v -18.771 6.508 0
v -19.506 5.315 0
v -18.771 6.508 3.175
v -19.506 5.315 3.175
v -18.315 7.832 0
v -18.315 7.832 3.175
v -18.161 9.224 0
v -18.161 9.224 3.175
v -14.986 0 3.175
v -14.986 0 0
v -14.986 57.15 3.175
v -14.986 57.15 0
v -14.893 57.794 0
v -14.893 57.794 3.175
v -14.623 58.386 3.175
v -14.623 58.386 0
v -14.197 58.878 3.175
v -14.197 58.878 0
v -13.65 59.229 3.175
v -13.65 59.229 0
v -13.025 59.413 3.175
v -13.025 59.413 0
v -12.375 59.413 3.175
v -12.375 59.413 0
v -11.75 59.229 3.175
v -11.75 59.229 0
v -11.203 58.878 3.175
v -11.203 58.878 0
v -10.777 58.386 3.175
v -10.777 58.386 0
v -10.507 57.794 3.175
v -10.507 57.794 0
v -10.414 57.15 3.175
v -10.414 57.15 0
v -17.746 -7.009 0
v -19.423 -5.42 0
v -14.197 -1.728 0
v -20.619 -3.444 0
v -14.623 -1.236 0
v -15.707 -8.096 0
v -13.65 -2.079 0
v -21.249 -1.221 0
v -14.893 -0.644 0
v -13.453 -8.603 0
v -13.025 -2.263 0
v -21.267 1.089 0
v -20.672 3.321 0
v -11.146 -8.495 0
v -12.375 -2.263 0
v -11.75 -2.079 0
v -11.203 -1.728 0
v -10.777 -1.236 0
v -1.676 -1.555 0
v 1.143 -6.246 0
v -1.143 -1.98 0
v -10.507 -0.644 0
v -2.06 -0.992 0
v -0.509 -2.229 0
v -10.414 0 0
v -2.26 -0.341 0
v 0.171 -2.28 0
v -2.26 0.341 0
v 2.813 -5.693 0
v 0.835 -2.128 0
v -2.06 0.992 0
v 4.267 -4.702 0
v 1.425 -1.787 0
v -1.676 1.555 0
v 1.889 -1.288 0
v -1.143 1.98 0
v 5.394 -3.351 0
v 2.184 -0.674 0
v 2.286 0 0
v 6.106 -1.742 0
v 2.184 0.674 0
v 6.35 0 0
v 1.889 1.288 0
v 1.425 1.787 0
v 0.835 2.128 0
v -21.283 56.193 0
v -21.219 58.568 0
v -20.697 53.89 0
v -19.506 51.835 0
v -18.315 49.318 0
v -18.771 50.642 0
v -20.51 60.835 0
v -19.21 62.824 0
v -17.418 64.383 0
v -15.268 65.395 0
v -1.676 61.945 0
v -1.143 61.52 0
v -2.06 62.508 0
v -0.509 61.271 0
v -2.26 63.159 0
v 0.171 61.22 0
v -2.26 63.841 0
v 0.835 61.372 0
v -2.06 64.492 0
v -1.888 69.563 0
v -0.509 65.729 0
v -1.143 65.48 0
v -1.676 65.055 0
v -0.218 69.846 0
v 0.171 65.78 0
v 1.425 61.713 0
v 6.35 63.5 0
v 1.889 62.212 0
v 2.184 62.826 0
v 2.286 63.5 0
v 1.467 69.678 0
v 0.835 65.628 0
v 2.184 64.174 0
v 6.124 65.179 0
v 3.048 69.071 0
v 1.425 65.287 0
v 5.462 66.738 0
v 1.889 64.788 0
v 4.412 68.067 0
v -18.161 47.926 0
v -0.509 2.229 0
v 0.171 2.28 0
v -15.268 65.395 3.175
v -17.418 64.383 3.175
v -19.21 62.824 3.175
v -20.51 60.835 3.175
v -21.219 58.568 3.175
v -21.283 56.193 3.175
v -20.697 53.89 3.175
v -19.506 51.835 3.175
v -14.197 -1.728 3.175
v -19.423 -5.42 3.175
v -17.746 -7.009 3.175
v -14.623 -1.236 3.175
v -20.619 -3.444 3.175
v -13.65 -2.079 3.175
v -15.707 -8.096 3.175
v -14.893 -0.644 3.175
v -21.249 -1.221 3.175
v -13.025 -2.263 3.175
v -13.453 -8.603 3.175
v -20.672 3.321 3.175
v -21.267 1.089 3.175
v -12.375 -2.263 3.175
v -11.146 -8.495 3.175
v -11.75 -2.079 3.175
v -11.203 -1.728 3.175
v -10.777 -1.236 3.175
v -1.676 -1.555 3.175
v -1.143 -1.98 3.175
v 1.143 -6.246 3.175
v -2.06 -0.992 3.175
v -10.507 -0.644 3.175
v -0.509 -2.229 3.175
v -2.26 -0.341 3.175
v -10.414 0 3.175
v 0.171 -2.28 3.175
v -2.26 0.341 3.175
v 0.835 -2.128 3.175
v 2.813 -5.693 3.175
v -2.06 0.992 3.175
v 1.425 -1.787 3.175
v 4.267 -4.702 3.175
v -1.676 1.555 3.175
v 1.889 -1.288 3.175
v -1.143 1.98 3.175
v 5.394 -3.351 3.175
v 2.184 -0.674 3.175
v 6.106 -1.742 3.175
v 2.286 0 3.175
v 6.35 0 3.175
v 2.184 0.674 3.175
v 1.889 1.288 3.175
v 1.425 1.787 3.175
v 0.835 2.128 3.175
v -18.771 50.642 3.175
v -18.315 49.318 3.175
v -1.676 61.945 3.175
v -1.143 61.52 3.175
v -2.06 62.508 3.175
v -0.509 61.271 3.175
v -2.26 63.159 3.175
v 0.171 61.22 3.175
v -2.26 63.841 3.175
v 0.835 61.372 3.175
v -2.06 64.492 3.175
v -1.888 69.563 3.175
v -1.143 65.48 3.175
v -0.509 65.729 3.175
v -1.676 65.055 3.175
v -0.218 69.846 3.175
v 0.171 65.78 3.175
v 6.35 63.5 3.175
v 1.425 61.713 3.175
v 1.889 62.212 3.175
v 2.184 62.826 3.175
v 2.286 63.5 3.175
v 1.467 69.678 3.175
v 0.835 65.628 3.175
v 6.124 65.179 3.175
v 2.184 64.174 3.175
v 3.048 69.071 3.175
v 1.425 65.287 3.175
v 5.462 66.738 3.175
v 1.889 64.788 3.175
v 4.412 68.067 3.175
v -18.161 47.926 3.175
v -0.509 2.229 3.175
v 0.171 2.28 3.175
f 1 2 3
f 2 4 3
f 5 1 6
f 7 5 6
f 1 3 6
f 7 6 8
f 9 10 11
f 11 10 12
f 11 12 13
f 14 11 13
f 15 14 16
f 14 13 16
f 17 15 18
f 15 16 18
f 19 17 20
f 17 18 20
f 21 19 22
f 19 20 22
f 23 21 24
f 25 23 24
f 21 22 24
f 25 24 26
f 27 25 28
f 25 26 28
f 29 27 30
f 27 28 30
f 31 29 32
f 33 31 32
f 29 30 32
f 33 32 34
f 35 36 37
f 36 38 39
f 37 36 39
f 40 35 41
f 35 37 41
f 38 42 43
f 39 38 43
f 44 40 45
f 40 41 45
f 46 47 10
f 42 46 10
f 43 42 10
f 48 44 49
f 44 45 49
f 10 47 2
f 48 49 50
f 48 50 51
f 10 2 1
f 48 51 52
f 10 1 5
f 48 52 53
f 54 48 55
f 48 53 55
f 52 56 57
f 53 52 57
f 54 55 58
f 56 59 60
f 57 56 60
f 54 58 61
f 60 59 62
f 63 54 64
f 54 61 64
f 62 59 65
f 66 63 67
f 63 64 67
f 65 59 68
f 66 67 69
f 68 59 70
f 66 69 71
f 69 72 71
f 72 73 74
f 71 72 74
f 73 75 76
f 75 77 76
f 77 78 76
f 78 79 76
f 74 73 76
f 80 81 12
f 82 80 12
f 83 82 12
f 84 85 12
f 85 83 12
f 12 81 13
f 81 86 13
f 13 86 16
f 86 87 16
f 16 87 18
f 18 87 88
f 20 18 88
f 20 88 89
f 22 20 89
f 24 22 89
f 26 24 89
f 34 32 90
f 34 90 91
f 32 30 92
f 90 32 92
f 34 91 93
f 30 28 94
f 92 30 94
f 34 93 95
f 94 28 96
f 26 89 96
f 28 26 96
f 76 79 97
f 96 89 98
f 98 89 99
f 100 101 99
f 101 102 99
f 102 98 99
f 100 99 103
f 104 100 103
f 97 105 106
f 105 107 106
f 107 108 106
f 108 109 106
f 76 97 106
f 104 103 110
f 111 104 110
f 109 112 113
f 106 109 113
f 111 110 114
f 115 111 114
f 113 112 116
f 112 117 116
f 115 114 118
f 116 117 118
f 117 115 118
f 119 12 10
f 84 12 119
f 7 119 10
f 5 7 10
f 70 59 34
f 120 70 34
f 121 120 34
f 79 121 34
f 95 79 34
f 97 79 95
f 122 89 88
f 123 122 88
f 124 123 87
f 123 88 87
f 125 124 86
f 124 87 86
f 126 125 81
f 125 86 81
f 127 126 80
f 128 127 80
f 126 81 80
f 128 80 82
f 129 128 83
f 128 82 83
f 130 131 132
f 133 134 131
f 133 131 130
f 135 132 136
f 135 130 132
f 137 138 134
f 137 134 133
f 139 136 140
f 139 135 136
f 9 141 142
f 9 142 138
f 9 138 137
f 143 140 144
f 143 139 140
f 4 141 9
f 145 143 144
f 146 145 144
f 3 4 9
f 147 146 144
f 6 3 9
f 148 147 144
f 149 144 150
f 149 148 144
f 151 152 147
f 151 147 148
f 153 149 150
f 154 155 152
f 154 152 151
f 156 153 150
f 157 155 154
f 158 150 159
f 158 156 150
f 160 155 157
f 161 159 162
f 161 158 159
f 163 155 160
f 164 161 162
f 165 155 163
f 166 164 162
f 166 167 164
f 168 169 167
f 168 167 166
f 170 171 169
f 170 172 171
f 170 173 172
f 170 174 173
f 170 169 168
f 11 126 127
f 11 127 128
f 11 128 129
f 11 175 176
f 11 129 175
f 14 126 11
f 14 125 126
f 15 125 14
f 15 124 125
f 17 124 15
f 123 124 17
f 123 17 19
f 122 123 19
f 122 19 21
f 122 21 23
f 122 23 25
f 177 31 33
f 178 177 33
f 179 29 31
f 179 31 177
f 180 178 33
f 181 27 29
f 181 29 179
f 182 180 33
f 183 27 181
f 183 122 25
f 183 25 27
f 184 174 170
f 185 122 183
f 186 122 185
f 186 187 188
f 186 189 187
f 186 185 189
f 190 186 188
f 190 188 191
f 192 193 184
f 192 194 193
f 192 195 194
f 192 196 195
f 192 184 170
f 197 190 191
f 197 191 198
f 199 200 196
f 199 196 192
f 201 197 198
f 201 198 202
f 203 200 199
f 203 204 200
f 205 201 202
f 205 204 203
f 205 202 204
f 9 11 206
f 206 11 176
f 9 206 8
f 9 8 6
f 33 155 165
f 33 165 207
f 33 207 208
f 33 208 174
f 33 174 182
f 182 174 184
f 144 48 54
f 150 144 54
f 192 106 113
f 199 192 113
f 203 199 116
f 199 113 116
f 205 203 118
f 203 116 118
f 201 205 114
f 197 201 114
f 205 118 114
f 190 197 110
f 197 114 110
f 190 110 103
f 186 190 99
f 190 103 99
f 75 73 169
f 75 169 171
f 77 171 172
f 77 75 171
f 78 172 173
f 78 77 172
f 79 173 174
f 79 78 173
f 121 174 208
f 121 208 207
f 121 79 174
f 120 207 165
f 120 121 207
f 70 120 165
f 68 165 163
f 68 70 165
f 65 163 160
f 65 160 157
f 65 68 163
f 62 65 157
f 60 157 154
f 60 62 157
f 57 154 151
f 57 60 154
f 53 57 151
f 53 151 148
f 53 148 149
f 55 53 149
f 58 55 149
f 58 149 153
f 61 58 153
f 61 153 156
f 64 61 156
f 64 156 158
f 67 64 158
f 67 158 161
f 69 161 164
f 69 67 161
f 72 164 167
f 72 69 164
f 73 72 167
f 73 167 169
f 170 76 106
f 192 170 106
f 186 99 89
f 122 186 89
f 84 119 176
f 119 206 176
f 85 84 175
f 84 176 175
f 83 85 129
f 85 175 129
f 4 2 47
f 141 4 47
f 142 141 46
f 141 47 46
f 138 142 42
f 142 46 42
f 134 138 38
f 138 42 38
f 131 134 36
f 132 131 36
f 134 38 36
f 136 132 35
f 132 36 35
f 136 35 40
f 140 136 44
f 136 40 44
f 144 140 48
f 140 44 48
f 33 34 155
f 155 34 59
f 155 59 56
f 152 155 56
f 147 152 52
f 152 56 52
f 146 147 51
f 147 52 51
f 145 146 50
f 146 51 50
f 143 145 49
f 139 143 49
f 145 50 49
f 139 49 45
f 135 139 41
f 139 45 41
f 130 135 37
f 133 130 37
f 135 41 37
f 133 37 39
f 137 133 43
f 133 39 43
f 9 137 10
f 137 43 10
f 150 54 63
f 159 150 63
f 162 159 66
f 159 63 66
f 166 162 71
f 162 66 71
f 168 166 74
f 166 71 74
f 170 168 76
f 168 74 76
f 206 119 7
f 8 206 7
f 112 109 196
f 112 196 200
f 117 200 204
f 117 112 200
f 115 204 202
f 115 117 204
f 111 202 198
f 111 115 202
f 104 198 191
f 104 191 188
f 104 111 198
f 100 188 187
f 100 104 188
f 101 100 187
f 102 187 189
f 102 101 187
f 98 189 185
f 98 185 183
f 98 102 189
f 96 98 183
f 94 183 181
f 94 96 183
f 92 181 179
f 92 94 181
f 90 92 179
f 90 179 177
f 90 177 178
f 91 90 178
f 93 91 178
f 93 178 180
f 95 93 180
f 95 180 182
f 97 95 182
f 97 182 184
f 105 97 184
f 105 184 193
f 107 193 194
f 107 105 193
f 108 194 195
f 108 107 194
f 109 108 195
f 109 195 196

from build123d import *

# Parameters (mm, degrees)
SKETCH1_R           = 2.286
BOSS_EXTRUDE1_DEPTH = 3.175
FILLET1_R           = 6.35


with BuildPart() as part:
    # Sketch1 → Boss-Extrude1 (new body)
    with BuildSketch(Plane.XY):
        with BuildLine():
            Line((-11.14552, -8.494944846), (1.143, -6.246282975))
            ThreePointArc((1.143, -6.246282975), (4.87752755, -4.065983891), (6.35, 0))
            Line((6.35, 0), (6.35, 63.5))
            ThreePointArc((6.35, 63.5), (3.763735435, 68.614371474), (-1.88836081, 69.562721621))
            Line((-1.88836081, 69.562721621), (-15.268170702, 65.395301404))
            ThreePointArc((-15.268170702, 65.395301404), (-21.178428452, 58.792177512), (-18.161, 50.459859867))
            Line((-18.161, 50.459859867), (-18.161, 6.690140133))
            ThreePointArc((-18.161, 6.690140133), (-20.53976569, -3.621956643), (-11.14552, -8.494944846))
        make_face()
        Circle(SKETCH1_R, mode=Mode.SUBTRACT)
        with Locations((0, 63.5)):
            Circle(SKETCH1_R, mode=Mode.SUBTRACT)
        with BuildLine():
            Line((-14.986, 0), (-14.986, 57.15))
            ThreePointArc((-14.986, 57.15), (-12.7, 59.436), (-10.414, 57.15))
            Line((-10.414, 57.15), (-10.414, 0))
            ThreePointArc((-10.414, 0), (-12.7, -2.286), (-14.986, 0))
        make_face(mode=Mode.SUBTRACT)
    extrude(amount=BOSS_EXTRUDE1_DEPTH)

    # Fillet1
    fillet1_edges = [part.edges().sort_by_distance(p)[0] for p in [
        (-18.161, 6.690140133, 1.5875),
        (-18.161, 50.459859867, 1.5875),
    ]]
    fillet(fillet1_edges, radius=FILLET1_R)


solid = part.part
